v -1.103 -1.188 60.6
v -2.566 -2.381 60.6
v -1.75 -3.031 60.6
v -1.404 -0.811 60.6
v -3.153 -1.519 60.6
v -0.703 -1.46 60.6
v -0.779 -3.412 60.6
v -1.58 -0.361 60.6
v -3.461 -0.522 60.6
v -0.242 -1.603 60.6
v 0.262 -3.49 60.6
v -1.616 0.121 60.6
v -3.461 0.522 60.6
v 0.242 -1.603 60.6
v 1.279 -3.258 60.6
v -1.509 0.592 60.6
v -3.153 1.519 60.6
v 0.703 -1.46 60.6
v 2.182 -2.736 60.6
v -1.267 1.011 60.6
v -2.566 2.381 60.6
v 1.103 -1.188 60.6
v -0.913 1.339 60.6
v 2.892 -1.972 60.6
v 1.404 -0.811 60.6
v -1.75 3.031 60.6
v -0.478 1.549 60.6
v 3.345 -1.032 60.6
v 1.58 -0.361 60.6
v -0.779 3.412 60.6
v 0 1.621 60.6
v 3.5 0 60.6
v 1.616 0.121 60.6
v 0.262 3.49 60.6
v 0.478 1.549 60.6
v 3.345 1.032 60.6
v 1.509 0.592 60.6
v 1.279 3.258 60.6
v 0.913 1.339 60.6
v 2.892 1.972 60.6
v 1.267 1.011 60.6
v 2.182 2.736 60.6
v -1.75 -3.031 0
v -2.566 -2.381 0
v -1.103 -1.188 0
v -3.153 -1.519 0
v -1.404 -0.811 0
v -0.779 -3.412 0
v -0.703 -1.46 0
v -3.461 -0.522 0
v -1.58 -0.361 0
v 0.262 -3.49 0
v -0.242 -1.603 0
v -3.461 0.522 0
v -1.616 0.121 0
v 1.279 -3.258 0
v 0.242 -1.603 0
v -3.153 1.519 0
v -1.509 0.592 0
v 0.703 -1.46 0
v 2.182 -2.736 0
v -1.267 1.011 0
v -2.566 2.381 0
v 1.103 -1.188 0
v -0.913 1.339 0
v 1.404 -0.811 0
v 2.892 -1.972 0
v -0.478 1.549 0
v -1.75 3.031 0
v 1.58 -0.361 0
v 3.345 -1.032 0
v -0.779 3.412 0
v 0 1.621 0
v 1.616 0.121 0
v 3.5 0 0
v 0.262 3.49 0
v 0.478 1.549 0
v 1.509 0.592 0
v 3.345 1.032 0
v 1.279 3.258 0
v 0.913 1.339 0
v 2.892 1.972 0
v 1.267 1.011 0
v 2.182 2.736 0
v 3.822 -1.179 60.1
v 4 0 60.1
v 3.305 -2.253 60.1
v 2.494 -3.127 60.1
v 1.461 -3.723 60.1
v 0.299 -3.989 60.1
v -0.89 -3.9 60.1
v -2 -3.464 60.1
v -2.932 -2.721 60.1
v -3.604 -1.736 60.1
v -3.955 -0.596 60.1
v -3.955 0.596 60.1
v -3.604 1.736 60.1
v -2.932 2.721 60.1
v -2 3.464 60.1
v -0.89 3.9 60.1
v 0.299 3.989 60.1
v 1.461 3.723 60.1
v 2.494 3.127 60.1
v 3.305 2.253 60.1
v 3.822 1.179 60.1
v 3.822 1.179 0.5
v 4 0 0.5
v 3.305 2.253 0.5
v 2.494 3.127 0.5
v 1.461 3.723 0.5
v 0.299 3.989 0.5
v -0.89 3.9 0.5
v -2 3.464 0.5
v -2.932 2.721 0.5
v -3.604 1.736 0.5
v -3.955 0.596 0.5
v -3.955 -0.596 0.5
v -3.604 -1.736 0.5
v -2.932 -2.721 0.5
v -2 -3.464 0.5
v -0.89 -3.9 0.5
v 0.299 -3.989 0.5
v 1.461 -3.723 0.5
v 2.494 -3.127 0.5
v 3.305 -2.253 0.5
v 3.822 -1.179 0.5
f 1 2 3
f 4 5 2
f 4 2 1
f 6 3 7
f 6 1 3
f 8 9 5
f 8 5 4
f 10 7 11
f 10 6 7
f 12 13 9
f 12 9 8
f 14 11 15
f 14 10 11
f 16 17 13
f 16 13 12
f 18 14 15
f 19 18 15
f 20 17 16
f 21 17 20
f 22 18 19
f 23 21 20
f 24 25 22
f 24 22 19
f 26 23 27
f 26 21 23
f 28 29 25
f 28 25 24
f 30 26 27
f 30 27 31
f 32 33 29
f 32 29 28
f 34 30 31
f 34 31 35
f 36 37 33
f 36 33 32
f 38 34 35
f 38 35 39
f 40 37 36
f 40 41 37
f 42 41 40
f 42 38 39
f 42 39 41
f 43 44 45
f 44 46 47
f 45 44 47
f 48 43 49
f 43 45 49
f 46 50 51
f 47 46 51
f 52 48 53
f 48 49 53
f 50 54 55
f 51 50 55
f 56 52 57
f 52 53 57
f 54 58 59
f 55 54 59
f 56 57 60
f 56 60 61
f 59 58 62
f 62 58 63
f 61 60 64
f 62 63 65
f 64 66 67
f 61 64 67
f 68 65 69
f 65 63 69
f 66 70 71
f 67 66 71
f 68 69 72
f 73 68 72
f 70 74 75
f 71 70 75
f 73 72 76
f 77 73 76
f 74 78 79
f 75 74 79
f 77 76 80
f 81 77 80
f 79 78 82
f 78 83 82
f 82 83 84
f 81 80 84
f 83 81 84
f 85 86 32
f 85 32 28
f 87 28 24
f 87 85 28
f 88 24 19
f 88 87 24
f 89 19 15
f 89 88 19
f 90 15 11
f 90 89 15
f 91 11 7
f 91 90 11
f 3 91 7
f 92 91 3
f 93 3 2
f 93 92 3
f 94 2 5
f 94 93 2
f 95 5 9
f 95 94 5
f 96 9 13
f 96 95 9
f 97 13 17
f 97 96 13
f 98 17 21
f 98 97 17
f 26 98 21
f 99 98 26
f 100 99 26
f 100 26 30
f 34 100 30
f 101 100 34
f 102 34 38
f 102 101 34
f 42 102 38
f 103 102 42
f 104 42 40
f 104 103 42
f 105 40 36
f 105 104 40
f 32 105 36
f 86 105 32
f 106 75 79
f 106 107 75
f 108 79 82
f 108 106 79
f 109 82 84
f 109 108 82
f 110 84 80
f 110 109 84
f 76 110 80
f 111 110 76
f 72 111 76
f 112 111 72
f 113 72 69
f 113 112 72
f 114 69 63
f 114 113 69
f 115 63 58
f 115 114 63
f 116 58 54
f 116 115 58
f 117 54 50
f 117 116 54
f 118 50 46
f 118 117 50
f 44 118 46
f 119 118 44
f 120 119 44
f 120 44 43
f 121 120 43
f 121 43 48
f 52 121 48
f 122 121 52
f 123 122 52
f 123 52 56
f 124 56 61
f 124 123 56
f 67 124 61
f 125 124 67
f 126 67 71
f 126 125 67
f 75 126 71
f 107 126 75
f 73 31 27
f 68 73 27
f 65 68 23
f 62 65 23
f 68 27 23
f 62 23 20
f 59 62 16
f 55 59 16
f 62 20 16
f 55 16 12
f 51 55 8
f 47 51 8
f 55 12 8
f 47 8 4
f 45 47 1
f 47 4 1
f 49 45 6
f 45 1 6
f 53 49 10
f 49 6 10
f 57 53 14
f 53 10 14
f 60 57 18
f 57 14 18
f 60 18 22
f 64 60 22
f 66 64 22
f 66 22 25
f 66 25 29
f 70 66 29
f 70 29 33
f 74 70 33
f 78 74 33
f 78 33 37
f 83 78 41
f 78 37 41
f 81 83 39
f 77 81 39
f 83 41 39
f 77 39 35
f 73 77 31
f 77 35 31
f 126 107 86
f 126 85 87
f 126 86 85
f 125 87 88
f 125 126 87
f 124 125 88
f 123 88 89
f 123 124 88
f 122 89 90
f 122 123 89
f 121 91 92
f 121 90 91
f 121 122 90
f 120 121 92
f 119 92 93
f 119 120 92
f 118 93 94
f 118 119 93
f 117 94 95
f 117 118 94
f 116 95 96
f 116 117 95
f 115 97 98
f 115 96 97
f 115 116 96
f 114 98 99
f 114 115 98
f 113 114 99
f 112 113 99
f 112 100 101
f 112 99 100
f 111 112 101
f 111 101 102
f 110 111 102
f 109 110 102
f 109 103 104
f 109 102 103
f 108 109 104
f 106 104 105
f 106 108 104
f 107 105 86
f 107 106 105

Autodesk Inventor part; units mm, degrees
ref_plane "YZ Plane" through (0, 0, 0) normal (1, 0, 0) x (0, 1, 0)
ref_plane "XZ Plane" through (0, 0, 0) normal (0, 1, 0) x (-1, 0, 0)
ref_plane "XY Plane" through (0, 0, 0) normal (0, 0, 1) x (1, 0, 0)
sketch "Sketch1" plane through (0, 0, 0) normal (0, 0, 1) x (1, 0, 0)
  circle A0 centre (0, 0) radius 4
  dimension "d0" = 8
extrude "Extrusion1" add sketch "Sketch1" along normal blind 60.6
chamfer "Chamfer1" distance 0.5 angle 45 2 edges at (-4, 0, 0) (-4, 0, 60.6)
hole "Hole1" at (0, 0, 0) direction (0, 0, 1) diameter 3.242 end through all thread size "M4x0.7" class "6H" standard "ISO Metric profile"
properties part number "asjes" material "Aluminum 6061"
